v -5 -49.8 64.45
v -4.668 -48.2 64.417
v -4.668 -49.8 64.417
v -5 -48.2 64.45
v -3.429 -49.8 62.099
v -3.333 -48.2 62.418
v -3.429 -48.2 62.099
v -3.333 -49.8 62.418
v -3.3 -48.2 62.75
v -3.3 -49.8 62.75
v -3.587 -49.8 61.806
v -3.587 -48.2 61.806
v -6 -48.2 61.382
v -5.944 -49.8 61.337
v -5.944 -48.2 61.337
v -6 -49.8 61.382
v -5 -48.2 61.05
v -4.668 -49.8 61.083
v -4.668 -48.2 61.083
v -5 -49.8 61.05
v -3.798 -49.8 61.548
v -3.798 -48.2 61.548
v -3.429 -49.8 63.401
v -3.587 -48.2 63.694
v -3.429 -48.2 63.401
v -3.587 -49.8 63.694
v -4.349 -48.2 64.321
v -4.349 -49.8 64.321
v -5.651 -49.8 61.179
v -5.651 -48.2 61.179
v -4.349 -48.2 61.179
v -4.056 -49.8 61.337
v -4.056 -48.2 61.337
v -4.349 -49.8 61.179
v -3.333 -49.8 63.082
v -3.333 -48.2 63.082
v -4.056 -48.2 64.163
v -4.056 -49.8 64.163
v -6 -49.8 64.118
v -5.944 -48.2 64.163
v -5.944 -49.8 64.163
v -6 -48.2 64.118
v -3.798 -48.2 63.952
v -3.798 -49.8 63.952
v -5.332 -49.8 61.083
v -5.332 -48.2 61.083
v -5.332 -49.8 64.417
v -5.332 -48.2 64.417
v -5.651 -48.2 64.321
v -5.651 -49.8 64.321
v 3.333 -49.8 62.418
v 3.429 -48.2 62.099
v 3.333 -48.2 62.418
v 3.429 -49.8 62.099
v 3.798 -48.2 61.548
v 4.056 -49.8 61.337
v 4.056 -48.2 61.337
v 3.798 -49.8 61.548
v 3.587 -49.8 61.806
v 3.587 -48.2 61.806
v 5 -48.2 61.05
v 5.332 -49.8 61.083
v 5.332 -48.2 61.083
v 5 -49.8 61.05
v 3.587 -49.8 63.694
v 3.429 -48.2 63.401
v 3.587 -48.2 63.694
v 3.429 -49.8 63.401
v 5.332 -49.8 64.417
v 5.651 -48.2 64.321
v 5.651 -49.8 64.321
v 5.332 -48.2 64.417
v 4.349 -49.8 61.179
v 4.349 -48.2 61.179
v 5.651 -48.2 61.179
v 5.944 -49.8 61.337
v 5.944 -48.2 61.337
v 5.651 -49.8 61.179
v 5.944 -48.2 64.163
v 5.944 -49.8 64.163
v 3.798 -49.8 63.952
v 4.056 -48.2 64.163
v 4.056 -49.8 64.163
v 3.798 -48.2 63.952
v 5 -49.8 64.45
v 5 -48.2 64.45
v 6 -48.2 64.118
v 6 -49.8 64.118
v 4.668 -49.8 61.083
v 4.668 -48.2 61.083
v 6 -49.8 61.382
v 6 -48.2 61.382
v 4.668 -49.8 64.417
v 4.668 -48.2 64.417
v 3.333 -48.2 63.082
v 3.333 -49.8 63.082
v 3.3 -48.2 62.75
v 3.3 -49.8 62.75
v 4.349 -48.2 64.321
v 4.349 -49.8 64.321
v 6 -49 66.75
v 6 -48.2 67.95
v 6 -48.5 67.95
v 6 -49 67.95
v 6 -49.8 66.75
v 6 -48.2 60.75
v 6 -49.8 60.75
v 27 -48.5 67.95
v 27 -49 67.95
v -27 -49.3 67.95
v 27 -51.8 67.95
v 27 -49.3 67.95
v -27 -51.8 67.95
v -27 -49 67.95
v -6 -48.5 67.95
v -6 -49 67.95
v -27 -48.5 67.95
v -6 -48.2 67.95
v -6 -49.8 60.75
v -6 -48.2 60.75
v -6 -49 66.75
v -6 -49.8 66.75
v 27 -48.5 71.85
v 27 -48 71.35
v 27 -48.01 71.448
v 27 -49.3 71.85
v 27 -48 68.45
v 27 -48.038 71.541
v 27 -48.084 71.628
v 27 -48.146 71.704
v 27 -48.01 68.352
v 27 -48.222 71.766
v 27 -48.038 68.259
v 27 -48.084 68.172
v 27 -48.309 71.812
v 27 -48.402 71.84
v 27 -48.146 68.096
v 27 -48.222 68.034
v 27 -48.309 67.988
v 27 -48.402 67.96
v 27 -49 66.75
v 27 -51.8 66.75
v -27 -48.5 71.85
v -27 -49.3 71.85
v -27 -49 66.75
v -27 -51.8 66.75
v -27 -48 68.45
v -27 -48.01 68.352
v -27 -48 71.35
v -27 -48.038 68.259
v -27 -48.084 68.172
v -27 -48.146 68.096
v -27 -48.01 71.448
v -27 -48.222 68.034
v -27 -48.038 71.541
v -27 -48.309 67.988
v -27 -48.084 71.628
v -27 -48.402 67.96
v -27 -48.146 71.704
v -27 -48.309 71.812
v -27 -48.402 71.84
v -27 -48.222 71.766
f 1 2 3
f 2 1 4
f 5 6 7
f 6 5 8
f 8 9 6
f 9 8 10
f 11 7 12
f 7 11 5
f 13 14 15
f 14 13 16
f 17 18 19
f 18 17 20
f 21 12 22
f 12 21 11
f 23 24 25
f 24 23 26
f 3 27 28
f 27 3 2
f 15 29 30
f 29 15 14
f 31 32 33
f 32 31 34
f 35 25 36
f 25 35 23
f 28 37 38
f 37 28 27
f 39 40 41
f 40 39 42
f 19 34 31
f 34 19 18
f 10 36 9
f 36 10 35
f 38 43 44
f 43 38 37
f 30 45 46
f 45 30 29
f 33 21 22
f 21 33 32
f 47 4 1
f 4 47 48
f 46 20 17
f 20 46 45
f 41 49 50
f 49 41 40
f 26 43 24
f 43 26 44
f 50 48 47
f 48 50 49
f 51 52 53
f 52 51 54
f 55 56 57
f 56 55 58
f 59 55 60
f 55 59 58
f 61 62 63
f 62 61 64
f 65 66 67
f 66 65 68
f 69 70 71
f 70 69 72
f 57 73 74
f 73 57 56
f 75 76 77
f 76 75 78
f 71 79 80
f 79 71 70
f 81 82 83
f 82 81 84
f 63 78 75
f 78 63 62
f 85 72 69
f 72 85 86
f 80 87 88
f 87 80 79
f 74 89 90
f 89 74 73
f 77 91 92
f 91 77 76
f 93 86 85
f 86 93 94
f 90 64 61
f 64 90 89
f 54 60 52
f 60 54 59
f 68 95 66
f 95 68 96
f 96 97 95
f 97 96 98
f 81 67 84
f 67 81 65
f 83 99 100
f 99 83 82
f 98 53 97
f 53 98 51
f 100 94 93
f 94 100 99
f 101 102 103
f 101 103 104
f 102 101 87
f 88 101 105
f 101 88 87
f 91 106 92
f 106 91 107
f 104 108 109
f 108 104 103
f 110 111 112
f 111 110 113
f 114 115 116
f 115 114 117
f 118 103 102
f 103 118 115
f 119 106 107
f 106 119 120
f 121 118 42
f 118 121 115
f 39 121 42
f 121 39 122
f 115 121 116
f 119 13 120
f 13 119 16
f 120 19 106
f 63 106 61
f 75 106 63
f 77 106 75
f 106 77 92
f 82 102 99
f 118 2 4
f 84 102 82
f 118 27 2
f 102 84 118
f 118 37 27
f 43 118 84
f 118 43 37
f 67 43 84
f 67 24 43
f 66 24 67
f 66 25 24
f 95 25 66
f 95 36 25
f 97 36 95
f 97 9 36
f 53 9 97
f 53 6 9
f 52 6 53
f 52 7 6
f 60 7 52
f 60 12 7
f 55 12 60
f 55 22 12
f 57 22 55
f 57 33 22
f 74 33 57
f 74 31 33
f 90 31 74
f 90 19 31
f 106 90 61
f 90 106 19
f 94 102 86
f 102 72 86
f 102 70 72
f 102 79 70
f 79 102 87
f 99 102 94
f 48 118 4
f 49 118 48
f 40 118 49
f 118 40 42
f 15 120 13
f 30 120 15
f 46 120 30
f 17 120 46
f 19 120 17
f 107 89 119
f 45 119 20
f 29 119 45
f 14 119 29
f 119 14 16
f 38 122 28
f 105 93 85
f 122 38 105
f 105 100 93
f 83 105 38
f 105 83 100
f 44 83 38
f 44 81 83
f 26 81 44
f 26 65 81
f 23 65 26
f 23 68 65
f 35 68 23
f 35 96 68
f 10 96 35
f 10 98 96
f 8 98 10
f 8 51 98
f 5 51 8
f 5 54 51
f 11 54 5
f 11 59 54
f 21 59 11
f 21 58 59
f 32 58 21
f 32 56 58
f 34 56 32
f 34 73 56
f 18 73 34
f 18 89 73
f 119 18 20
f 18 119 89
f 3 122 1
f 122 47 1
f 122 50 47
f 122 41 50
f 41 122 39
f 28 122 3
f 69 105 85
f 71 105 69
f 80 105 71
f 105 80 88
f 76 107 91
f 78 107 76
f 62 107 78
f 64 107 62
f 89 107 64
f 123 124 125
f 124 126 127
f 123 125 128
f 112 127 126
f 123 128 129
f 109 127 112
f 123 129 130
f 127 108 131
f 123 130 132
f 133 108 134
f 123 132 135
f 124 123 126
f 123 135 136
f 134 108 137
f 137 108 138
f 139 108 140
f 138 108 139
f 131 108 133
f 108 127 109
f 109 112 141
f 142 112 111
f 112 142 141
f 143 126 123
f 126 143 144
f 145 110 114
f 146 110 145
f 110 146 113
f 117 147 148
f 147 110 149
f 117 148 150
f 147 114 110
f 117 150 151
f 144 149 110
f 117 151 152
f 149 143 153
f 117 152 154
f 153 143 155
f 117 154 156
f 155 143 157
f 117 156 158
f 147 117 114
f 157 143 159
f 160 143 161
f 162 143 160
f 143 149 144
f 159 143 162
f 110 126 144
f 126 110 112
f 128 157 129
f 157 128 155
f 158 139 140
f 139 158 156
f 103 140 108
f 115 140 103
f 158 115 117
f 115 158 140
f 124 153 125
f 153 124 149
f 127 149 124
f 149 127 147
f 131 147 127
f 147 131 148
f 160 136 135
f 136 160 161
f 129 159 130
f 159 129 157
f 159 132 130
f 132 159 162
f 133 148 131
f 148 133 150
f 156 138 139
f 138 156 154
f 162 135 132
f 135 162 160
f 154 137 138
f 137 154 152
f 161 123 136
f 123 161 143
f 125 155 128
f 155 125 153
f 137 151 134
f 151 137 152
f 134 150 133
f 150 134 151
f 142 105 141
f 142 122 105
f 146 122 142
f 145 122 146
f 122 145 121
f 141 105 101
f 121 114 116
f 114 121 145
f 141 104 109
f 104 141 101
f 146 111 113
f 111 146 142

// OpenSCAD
// =============================================================================
// CASE_SLOT GROMMET — TPU edge liner, riser -Y cable drop (print: TPU 95A)
// =============================================================================
// #41 retired jetson_cowl.scad: right-angle plug adapters now turn each
// Jetson cable DOWN at the port so it drops straight through the riser's
// existing -Y CASE_SLOT (riser_bay.scad) into the bay -- no cowl needed.
// That leaves the slot's cable-bearing edge as bare printed PA6, chafing
// the DC-barrel/RJ45/USB-C bundle on every vibration cycle. This is a TPU
// U-channel liner modeled on leg_v6/grommet_insert.scad (#30: slit liner,
// rounded lips both faces, wraps a bare edge) -- adapted from a closed
// bore to a straight OPEN edge, because CASE_SLOT is a long-thin THROUGH
// SLOT in a 4mm deck plate, not a round hole in a wall.
//
// ---- CASE_SLOT geometry (riser_bay.scad, read 2026-07-10) ------------------
// CASE_SLOT = [-30, 30, -49, -40]  (x0,x1,y0,y1), trunk frame. DECK_T=4.0,
// DECK_BOT=67.9, DECK_TOP=71.9 (riser_bay.scad consts). Documented as the
// case -Y-flank cable drop, sized 9mm wide in y (clears the ~6mm RJ45
// cable + margin), sitting between the Jetson case footprint (y-46.95) and
// the riser skirt inner (y-51.8), with a 6mm solid rim to the deck's own
// -Y edge (OUT_Y=55). This liner targets the -Y OUTER edge, y0 = -49
// (the far edge from the case, where a cable dropping past the -y flank
// naturally bows as it falls away from the case body -- matches this
// file's own strain-relief tab placement and the task's explicit "at
// minimum the -Y outer edge the bundle rests against" fallback).
//
// *** FIXED 2026-07-10 — riser_bay.scad CASE_SLOT cut now matches its docs ***
// Previously riser_bay.scad line ~194 called `rounded_slot(CASE_SLOT..., 4)`
// -- a hull-of-4-corner-circles with r=4 -- on a slot whose y-span was only
// 4.5mm (needs r <= half the short span, i.e. <=2.25). The corner circles
// inverted past each other and the hull blew the cut out to y approx
// -55.0..-43.5, breaching the deck's own -Y edge (OUT_Y=55) and eating well
// under the Jetson case footprint. Root-caused and fixed alongside this
// re-tune: CASE_SLOT widened to 9mm (y-49..-40, was y-51.5..-47) so it
// actually clears the cable bundle, and the rounded_slot r dropped 4 -> 2.0
// (<= half the new 9mm span) so the cut is exact-bounds again. This liner's
// EDGE_Y/LEG_REACH below are re-tuned to the new bounds (grip check WARN
// went from 34% to see build log / check_fit.py output for the current
// figure).
//
// ---- design: straight edge liner, not a closed-bore grommet ----------------
// A full-perimeter ring (grommet_insert.scad's approach) would eat a
// wall's worth of clearance on all sides of the channel -- not enough room
// left for 3 real cables even at the widened 9mm. Instead this is a
// hook-profile edge liner that clips onto ONLY the -Y outer edge (spine
// caps the raw PA6 corner, ONE leg grips the deck's BOTTOM/bay face) --
// same shape family as door/panel edge trim, but ASYMMETRIC (see below).
//
// *** Still BOTTOM-LEG-ONLY after the 2026-07-10 re-tune (see below) ***
// A symmetric two-leg design (grip caps on both the deck's top AND bottom
// faces, like grommet_insert.scad's two lips) was the original first pass
// here, rejected because jetson_case_mount.scad's -Y tie-rail
// (`translate([CX0, -53.35, DECK]) cube([..., 1.35, 3])`, i.e. y
// -53.35..-52, z 71.9..74.9, running the tie rail's full x length) sits
// DIRECTLY on top of the deck at that (x,y) footprint -- any liner material
// proud of the deck's TOP face (z>71.9) in that y-band collides with it.
// The CASE_SLOT re-size (riser_bay.scad, 2026-07-10) moved the outer edge
// from y-51.5 to y-49, which grew the tie-rail clearance from 0.5mm to
// 3mm -- enough that a top leg *could* fit now, but this liner stays
// BOTTOM-LEG-ONLY anyway: the spine interference + bottom leg give a light
// edge clip against the new 6mm-deep solid rim (see LEG_REACH below) —
// enough to hold position; the ZIP-TIE TAB is the primary retention (this
// part carries no load of its own). (Note: the old check_fit ">85% of
// volume in solid" target was a closed-bore-grommet metric that doesn't
// apply to an open edge liner — reframed to informational; ~40% overlap
// here is normal, most of the liner IS the exposed cable channel.) A
// top leg would still eat into that 3mm margin against a moving part
// (jetson_case_mount.scad could rev again), and the spine still rounds the
// top (case-side) transition (profile reaches to within 0.05mm of the true
// deck top, z<=DECK_TOP) without needing a full cap there. Retention is the
// spine's interference fit (GAP undersized vs DECK_T) plus the bottom leg
// -- lighter grip than a two-sided clip, adequate for a TPU part carrying
// no load of its own (cable weight only; tension is meant to be taken by
// the strain-relief tab, not the liner's friction fit). Checked in
// check_fit.py case 12b.
//
// Rounded spine (hull of X-axis corner cylinders, same idiom as
// riser_bay.scad's rounded_slot(), just swept along X instead of Z, and
// only rounded on the cable-facing +y side -- see spine_round() below)
// means the cable meets a TPU radius instead of the printed corner on
// BOTH the case-side entry and the bay-side exit. Open (no full wrap) =
// press-installs onto the edge directly, no threading/slitting required
// -- and it barely narrows the passage (spine protrudes SPINE_FWD ~1.0mm
// into the 9mm channel, leaving ~8mm clear for the bundle running
// single-file along the slot's 54mm liner length).
//
// Strain relief: a zip-pair tab (O3.4 x2, 10mm spacing -- matches
// leg_v6/cable_clip.scad's established anchor idiom) hangs off the
// bottom leg into the bay, so the bundle gets zip-tied to the GROMMET
// right where it enters the bay, not left to hang off the port plugs.
//
// Fit: GAP = DECK_T - 0.1 = 3.9 (light interference on the 4.0mm deck
// edge -- TPU 95A flexes on; kept small since there's no top leg to help
// hold it on, so the fit shouldn't need excessive install force either).
// LEG_REACH = 5.5 onto the bottom deck face for grip (re-tuned 2026-07-10
// for the widened CASE_SLOT -- see LEG_REACH sizing note below).
//
// Print: TPU 95A, flat (either flat face down, no supports), 100% infill,
// ~1 g (lighter than the original two-leg pass since the top leg is gone).
// Trunk-frame placement (this part IS built in trunk-frame world coords,
// like riser_bay.scad -- open both STLs together to check the fit
// visually): x centered 0 (CASE_SLOT x-center), spans x +/-27.
//
// Fit gate: chassis/check_fit.py case 12b (added alongside this file).
// build_all.sh renders + mesh_health.py-checks it.

$fn = 32;
EPS = 0.05;

// ---- source consts (riser_bay.scad / jetson_case_mount.scad — keep in sync) -
DECK_T   = 4.0;
DECK_BOT = 67.9;
DECK_TOP = 71.9;
EDGE_Y   = -49;        // CASE_SLOT[2], the -Y outer edge (riser_bay.scad,
                       // re-sized 2026-07-10; was -51.5 on the pre-fix 4.5mm slot)
SLOT_LEN = 60;         // CASE_SLOT[1] - CASE_SLOT[0]
TIE_RAIL_Y0 = -53.35; TIE_RAIL_Y1 = -52; TIE_RAIL_Z0 = DECK_TOP;  // jetson_case_mount.scad

// ---- liner geometry -----------------------------------------------------------
LINER_LEN  = 54;        // inset 3mm off each end — sits on the straight run,
                        // clear of the slot's own rounded corners
GAP        = DECK_T - 0.1;   // 3.9 — light interference grip on the deck edge
LEG_T      = 1.2;       // leg wall thickness (matches grommet_insert.scad FLG_T)
// LEG_REACH sizing (re-tuned 2026-07-10 for the widened CASE_SLOT): the
// deck plate itself (riser_bay.scad OUT_Y=55) ends at y=-55, now 6mm past
// EDGE_Y=-49 (was only 3.5mm past the old EDGE_Y=-51.5 -- that pre-fix
// margin forced LEG_REACH down to 3.0, leaving only 0.5mm of the leg
// actually inside the riser skirt's solid y-band (-51.8..-55), which is
// WHY the grip check read 34%: most of the leg sat over the *slot's own
// blown-out cut* (open air), not solid material. With the slot fixed AND
// re-centred, y-49..-55 is fully solid deck plate down to y-51.8 (skirt
// inner face) then solid skirt to y-55 -- so the leg can reach deep into
// real material again. LEG_REACH=5.5 lands the leg's outer edge at
// y=-54.5 (0.5mm shy of the true deck edge, same margin discipline as the
// original design), putting ~2.7mm of the leg's 5.5mm reach inside the
// 3.2mm-thick skirt (the real grip target -- the deck plate itself is
// only ~0.05mm thick at the leg's z-band, see Z0/Z1 below).
LEG_REACH  = 2.8;       // leg backstops on the skirt inner face (~y-51.8) —
                        // INSTALLABLE. 5.5 jammed ~2.7mm of TPU into the now-
                        // restored rigid skirt = too much interference for a
                        // press-fit (2026-07-10 review). Retention is the
                        // zip-tie tab, not leg grip, so a shorter installable
                        // leg is correct even though the (inverted) grip% drops.
SPINE_BACK = 0.3;       // spine's flat core reaches this far onto the
                        // material side (-y), overlapping the leg
SPINE_FWD  = 1.0;       // spine protrusion into the cable passage (+y) —
                        // rounds the raw edge without eating much clearance
CAP_R      = 0.5;       // spine corner-rounding radius (passage side only)

Z0 = DECK_BOT + (DECK_T - GAP) / 2;   // 67.95 — bottom of the grip gap
Z1 = DECK_TOP - (DECK_T - GAP) / 2;   // 71.85 — top of the grip gap, <= DECK_TOP
assert(Z1 <= TIE_RAIL_Z0, "liner top must not protrude above the deck (tie-rail clash)");

// spine rounding needs r <= half of the y-span it rounds — this is exactly
// the check riser_bay.scad's CASE_SLOT cut skipped (see the FLAG above);
// assert it here so this file can't repeat that bug.
assert(CAP_R <= (0.1 + SPINE_FWD) / 2, "CAP_R too big for the rounded cap's y-span");
assert(CAP_R <= (Z1 - Z0) / 2, "CAP_R too big for spine z-span (gap)");

// ---- strain-relief tie tab (zip-pair, cable_clip.scad idiom) ---------------
TAB_W    = 12;          // along X — fits the 10mm hole spacing + margin
TAB_DROP = 6;            // hangs this far below the bottom leg, into the bay
TAB_T    = 1.6;          // thicker than the leg — it carries real tension
TAB_HOLE = 3.4;          // zip-tie hole d (matches cable_clip.scad)
TAB_X    = 0;             // centered on the liner length

module xcyl(r, len) {
    rotate([0, 90, 0]) cylinder(r = r, h = len, center = true);
}

// rounded prism swept along X — the riser_bay.scad rounded_slot() idiom
// (hull of 4 corner circles), just built with X-axis cylinders instead of
// Z-axis ones so the extrusion runs the liner's length instead of the
// deck's thickness. Exact-bounds ONLY if r <= half of both spans (assert
// at the call site, not here — this module doesn't know the caller's math).
module rounded_prism(len, y0, y1, z0, z1, r) {
    hull()
        for (py = [y0 + r, y1 - r], pz = [z0 + r, z1 - r])
            translate([0, py, pz]) xcyl(r, len);
}

module case_slot_grommet() {
    union() {
        // spine FLAT CORE: square corners on the leg-facing (-y) side, so
        // it shares an exact rectangular face with the leg below (same
        // idiom every abutting cube in riser_bay.scad already uses) —
        // no rounding to fight there, avoids the corner-pullback trap a
        // uniformly-rounded prism hits right at its own z0/z1 planes
        // (hit this on the first pass: mesh_health caught bodies=3 from
        // the spine's rounded corners not actually reaching the legs).
        translate([-LINER_LEN / 2, EDGE_Y - SPINE_BACK, Z0])
            cube([LINER_LEN, SPINE_BACK + 0.5, Z1 - Z0]);
        // rounded CAP: only the passage-facing (+y) side needs rounding —
        // nothing ever rubs the grip/-y side. Overlaps generously into the
        // flat core above (0.3 overlap comfortably clears CAP_R's worst-
        // case corner pullback at z0/z1).
        rounded_prism(LINER_LEN, EDGE_Y - 0.2, EDGE_Y + SPINE_FWD, Z0, Z1, CAP_R);
        // bottom leg — grips the deck BOTTOM (bay-side) face. Flat
        // rectangular cross-section; its top face sits AT z=Z0 (matching
        // the spine core's bottom exactly) but the two cubes only union
        // cleanly if their Y-ranges actually OVERLAP at that shared
        // plane, not just touch at a single Y value (a leg that stopped
        // exactly at the core's own y0 shared only a zero-area edge —
        // hit this on the second pass, mesh_health caught watertight=False
        // bodies=2). +0.3 y-overlap past the core's y0 fixes it.
        translate([-LINER_LEN / 2, EDGE_Y - LEG_REACH, Z0 - LEG_T])
            cube([LINER_LEN, LEG_REACH - SPINE_BACK + 0.3, LEG_T]);
        // strain-relief tab, hanging off the bottom leg into the bay
        translate([TAB_X - TAB_W / 2, EDGE_Y - LEG_REACH + 2, Z0 - LEG_T - TAB_DROP])
            difference() {
                cube([TAB_W, TAB_T, TAB_DROP + LEG_T]);   // overlaps up into the leg
                for (sx = [-1, 1])
                    translate([TAB_W / 2 + sx * 5, -EPS, TAB_DROP - 4])
                        rotate([-90, 0, 0])
                            cylinder(d = TAB_HOLE, h = TAB_T + 2 * EPS);
            }
    }
}

case_slot_grommet();
